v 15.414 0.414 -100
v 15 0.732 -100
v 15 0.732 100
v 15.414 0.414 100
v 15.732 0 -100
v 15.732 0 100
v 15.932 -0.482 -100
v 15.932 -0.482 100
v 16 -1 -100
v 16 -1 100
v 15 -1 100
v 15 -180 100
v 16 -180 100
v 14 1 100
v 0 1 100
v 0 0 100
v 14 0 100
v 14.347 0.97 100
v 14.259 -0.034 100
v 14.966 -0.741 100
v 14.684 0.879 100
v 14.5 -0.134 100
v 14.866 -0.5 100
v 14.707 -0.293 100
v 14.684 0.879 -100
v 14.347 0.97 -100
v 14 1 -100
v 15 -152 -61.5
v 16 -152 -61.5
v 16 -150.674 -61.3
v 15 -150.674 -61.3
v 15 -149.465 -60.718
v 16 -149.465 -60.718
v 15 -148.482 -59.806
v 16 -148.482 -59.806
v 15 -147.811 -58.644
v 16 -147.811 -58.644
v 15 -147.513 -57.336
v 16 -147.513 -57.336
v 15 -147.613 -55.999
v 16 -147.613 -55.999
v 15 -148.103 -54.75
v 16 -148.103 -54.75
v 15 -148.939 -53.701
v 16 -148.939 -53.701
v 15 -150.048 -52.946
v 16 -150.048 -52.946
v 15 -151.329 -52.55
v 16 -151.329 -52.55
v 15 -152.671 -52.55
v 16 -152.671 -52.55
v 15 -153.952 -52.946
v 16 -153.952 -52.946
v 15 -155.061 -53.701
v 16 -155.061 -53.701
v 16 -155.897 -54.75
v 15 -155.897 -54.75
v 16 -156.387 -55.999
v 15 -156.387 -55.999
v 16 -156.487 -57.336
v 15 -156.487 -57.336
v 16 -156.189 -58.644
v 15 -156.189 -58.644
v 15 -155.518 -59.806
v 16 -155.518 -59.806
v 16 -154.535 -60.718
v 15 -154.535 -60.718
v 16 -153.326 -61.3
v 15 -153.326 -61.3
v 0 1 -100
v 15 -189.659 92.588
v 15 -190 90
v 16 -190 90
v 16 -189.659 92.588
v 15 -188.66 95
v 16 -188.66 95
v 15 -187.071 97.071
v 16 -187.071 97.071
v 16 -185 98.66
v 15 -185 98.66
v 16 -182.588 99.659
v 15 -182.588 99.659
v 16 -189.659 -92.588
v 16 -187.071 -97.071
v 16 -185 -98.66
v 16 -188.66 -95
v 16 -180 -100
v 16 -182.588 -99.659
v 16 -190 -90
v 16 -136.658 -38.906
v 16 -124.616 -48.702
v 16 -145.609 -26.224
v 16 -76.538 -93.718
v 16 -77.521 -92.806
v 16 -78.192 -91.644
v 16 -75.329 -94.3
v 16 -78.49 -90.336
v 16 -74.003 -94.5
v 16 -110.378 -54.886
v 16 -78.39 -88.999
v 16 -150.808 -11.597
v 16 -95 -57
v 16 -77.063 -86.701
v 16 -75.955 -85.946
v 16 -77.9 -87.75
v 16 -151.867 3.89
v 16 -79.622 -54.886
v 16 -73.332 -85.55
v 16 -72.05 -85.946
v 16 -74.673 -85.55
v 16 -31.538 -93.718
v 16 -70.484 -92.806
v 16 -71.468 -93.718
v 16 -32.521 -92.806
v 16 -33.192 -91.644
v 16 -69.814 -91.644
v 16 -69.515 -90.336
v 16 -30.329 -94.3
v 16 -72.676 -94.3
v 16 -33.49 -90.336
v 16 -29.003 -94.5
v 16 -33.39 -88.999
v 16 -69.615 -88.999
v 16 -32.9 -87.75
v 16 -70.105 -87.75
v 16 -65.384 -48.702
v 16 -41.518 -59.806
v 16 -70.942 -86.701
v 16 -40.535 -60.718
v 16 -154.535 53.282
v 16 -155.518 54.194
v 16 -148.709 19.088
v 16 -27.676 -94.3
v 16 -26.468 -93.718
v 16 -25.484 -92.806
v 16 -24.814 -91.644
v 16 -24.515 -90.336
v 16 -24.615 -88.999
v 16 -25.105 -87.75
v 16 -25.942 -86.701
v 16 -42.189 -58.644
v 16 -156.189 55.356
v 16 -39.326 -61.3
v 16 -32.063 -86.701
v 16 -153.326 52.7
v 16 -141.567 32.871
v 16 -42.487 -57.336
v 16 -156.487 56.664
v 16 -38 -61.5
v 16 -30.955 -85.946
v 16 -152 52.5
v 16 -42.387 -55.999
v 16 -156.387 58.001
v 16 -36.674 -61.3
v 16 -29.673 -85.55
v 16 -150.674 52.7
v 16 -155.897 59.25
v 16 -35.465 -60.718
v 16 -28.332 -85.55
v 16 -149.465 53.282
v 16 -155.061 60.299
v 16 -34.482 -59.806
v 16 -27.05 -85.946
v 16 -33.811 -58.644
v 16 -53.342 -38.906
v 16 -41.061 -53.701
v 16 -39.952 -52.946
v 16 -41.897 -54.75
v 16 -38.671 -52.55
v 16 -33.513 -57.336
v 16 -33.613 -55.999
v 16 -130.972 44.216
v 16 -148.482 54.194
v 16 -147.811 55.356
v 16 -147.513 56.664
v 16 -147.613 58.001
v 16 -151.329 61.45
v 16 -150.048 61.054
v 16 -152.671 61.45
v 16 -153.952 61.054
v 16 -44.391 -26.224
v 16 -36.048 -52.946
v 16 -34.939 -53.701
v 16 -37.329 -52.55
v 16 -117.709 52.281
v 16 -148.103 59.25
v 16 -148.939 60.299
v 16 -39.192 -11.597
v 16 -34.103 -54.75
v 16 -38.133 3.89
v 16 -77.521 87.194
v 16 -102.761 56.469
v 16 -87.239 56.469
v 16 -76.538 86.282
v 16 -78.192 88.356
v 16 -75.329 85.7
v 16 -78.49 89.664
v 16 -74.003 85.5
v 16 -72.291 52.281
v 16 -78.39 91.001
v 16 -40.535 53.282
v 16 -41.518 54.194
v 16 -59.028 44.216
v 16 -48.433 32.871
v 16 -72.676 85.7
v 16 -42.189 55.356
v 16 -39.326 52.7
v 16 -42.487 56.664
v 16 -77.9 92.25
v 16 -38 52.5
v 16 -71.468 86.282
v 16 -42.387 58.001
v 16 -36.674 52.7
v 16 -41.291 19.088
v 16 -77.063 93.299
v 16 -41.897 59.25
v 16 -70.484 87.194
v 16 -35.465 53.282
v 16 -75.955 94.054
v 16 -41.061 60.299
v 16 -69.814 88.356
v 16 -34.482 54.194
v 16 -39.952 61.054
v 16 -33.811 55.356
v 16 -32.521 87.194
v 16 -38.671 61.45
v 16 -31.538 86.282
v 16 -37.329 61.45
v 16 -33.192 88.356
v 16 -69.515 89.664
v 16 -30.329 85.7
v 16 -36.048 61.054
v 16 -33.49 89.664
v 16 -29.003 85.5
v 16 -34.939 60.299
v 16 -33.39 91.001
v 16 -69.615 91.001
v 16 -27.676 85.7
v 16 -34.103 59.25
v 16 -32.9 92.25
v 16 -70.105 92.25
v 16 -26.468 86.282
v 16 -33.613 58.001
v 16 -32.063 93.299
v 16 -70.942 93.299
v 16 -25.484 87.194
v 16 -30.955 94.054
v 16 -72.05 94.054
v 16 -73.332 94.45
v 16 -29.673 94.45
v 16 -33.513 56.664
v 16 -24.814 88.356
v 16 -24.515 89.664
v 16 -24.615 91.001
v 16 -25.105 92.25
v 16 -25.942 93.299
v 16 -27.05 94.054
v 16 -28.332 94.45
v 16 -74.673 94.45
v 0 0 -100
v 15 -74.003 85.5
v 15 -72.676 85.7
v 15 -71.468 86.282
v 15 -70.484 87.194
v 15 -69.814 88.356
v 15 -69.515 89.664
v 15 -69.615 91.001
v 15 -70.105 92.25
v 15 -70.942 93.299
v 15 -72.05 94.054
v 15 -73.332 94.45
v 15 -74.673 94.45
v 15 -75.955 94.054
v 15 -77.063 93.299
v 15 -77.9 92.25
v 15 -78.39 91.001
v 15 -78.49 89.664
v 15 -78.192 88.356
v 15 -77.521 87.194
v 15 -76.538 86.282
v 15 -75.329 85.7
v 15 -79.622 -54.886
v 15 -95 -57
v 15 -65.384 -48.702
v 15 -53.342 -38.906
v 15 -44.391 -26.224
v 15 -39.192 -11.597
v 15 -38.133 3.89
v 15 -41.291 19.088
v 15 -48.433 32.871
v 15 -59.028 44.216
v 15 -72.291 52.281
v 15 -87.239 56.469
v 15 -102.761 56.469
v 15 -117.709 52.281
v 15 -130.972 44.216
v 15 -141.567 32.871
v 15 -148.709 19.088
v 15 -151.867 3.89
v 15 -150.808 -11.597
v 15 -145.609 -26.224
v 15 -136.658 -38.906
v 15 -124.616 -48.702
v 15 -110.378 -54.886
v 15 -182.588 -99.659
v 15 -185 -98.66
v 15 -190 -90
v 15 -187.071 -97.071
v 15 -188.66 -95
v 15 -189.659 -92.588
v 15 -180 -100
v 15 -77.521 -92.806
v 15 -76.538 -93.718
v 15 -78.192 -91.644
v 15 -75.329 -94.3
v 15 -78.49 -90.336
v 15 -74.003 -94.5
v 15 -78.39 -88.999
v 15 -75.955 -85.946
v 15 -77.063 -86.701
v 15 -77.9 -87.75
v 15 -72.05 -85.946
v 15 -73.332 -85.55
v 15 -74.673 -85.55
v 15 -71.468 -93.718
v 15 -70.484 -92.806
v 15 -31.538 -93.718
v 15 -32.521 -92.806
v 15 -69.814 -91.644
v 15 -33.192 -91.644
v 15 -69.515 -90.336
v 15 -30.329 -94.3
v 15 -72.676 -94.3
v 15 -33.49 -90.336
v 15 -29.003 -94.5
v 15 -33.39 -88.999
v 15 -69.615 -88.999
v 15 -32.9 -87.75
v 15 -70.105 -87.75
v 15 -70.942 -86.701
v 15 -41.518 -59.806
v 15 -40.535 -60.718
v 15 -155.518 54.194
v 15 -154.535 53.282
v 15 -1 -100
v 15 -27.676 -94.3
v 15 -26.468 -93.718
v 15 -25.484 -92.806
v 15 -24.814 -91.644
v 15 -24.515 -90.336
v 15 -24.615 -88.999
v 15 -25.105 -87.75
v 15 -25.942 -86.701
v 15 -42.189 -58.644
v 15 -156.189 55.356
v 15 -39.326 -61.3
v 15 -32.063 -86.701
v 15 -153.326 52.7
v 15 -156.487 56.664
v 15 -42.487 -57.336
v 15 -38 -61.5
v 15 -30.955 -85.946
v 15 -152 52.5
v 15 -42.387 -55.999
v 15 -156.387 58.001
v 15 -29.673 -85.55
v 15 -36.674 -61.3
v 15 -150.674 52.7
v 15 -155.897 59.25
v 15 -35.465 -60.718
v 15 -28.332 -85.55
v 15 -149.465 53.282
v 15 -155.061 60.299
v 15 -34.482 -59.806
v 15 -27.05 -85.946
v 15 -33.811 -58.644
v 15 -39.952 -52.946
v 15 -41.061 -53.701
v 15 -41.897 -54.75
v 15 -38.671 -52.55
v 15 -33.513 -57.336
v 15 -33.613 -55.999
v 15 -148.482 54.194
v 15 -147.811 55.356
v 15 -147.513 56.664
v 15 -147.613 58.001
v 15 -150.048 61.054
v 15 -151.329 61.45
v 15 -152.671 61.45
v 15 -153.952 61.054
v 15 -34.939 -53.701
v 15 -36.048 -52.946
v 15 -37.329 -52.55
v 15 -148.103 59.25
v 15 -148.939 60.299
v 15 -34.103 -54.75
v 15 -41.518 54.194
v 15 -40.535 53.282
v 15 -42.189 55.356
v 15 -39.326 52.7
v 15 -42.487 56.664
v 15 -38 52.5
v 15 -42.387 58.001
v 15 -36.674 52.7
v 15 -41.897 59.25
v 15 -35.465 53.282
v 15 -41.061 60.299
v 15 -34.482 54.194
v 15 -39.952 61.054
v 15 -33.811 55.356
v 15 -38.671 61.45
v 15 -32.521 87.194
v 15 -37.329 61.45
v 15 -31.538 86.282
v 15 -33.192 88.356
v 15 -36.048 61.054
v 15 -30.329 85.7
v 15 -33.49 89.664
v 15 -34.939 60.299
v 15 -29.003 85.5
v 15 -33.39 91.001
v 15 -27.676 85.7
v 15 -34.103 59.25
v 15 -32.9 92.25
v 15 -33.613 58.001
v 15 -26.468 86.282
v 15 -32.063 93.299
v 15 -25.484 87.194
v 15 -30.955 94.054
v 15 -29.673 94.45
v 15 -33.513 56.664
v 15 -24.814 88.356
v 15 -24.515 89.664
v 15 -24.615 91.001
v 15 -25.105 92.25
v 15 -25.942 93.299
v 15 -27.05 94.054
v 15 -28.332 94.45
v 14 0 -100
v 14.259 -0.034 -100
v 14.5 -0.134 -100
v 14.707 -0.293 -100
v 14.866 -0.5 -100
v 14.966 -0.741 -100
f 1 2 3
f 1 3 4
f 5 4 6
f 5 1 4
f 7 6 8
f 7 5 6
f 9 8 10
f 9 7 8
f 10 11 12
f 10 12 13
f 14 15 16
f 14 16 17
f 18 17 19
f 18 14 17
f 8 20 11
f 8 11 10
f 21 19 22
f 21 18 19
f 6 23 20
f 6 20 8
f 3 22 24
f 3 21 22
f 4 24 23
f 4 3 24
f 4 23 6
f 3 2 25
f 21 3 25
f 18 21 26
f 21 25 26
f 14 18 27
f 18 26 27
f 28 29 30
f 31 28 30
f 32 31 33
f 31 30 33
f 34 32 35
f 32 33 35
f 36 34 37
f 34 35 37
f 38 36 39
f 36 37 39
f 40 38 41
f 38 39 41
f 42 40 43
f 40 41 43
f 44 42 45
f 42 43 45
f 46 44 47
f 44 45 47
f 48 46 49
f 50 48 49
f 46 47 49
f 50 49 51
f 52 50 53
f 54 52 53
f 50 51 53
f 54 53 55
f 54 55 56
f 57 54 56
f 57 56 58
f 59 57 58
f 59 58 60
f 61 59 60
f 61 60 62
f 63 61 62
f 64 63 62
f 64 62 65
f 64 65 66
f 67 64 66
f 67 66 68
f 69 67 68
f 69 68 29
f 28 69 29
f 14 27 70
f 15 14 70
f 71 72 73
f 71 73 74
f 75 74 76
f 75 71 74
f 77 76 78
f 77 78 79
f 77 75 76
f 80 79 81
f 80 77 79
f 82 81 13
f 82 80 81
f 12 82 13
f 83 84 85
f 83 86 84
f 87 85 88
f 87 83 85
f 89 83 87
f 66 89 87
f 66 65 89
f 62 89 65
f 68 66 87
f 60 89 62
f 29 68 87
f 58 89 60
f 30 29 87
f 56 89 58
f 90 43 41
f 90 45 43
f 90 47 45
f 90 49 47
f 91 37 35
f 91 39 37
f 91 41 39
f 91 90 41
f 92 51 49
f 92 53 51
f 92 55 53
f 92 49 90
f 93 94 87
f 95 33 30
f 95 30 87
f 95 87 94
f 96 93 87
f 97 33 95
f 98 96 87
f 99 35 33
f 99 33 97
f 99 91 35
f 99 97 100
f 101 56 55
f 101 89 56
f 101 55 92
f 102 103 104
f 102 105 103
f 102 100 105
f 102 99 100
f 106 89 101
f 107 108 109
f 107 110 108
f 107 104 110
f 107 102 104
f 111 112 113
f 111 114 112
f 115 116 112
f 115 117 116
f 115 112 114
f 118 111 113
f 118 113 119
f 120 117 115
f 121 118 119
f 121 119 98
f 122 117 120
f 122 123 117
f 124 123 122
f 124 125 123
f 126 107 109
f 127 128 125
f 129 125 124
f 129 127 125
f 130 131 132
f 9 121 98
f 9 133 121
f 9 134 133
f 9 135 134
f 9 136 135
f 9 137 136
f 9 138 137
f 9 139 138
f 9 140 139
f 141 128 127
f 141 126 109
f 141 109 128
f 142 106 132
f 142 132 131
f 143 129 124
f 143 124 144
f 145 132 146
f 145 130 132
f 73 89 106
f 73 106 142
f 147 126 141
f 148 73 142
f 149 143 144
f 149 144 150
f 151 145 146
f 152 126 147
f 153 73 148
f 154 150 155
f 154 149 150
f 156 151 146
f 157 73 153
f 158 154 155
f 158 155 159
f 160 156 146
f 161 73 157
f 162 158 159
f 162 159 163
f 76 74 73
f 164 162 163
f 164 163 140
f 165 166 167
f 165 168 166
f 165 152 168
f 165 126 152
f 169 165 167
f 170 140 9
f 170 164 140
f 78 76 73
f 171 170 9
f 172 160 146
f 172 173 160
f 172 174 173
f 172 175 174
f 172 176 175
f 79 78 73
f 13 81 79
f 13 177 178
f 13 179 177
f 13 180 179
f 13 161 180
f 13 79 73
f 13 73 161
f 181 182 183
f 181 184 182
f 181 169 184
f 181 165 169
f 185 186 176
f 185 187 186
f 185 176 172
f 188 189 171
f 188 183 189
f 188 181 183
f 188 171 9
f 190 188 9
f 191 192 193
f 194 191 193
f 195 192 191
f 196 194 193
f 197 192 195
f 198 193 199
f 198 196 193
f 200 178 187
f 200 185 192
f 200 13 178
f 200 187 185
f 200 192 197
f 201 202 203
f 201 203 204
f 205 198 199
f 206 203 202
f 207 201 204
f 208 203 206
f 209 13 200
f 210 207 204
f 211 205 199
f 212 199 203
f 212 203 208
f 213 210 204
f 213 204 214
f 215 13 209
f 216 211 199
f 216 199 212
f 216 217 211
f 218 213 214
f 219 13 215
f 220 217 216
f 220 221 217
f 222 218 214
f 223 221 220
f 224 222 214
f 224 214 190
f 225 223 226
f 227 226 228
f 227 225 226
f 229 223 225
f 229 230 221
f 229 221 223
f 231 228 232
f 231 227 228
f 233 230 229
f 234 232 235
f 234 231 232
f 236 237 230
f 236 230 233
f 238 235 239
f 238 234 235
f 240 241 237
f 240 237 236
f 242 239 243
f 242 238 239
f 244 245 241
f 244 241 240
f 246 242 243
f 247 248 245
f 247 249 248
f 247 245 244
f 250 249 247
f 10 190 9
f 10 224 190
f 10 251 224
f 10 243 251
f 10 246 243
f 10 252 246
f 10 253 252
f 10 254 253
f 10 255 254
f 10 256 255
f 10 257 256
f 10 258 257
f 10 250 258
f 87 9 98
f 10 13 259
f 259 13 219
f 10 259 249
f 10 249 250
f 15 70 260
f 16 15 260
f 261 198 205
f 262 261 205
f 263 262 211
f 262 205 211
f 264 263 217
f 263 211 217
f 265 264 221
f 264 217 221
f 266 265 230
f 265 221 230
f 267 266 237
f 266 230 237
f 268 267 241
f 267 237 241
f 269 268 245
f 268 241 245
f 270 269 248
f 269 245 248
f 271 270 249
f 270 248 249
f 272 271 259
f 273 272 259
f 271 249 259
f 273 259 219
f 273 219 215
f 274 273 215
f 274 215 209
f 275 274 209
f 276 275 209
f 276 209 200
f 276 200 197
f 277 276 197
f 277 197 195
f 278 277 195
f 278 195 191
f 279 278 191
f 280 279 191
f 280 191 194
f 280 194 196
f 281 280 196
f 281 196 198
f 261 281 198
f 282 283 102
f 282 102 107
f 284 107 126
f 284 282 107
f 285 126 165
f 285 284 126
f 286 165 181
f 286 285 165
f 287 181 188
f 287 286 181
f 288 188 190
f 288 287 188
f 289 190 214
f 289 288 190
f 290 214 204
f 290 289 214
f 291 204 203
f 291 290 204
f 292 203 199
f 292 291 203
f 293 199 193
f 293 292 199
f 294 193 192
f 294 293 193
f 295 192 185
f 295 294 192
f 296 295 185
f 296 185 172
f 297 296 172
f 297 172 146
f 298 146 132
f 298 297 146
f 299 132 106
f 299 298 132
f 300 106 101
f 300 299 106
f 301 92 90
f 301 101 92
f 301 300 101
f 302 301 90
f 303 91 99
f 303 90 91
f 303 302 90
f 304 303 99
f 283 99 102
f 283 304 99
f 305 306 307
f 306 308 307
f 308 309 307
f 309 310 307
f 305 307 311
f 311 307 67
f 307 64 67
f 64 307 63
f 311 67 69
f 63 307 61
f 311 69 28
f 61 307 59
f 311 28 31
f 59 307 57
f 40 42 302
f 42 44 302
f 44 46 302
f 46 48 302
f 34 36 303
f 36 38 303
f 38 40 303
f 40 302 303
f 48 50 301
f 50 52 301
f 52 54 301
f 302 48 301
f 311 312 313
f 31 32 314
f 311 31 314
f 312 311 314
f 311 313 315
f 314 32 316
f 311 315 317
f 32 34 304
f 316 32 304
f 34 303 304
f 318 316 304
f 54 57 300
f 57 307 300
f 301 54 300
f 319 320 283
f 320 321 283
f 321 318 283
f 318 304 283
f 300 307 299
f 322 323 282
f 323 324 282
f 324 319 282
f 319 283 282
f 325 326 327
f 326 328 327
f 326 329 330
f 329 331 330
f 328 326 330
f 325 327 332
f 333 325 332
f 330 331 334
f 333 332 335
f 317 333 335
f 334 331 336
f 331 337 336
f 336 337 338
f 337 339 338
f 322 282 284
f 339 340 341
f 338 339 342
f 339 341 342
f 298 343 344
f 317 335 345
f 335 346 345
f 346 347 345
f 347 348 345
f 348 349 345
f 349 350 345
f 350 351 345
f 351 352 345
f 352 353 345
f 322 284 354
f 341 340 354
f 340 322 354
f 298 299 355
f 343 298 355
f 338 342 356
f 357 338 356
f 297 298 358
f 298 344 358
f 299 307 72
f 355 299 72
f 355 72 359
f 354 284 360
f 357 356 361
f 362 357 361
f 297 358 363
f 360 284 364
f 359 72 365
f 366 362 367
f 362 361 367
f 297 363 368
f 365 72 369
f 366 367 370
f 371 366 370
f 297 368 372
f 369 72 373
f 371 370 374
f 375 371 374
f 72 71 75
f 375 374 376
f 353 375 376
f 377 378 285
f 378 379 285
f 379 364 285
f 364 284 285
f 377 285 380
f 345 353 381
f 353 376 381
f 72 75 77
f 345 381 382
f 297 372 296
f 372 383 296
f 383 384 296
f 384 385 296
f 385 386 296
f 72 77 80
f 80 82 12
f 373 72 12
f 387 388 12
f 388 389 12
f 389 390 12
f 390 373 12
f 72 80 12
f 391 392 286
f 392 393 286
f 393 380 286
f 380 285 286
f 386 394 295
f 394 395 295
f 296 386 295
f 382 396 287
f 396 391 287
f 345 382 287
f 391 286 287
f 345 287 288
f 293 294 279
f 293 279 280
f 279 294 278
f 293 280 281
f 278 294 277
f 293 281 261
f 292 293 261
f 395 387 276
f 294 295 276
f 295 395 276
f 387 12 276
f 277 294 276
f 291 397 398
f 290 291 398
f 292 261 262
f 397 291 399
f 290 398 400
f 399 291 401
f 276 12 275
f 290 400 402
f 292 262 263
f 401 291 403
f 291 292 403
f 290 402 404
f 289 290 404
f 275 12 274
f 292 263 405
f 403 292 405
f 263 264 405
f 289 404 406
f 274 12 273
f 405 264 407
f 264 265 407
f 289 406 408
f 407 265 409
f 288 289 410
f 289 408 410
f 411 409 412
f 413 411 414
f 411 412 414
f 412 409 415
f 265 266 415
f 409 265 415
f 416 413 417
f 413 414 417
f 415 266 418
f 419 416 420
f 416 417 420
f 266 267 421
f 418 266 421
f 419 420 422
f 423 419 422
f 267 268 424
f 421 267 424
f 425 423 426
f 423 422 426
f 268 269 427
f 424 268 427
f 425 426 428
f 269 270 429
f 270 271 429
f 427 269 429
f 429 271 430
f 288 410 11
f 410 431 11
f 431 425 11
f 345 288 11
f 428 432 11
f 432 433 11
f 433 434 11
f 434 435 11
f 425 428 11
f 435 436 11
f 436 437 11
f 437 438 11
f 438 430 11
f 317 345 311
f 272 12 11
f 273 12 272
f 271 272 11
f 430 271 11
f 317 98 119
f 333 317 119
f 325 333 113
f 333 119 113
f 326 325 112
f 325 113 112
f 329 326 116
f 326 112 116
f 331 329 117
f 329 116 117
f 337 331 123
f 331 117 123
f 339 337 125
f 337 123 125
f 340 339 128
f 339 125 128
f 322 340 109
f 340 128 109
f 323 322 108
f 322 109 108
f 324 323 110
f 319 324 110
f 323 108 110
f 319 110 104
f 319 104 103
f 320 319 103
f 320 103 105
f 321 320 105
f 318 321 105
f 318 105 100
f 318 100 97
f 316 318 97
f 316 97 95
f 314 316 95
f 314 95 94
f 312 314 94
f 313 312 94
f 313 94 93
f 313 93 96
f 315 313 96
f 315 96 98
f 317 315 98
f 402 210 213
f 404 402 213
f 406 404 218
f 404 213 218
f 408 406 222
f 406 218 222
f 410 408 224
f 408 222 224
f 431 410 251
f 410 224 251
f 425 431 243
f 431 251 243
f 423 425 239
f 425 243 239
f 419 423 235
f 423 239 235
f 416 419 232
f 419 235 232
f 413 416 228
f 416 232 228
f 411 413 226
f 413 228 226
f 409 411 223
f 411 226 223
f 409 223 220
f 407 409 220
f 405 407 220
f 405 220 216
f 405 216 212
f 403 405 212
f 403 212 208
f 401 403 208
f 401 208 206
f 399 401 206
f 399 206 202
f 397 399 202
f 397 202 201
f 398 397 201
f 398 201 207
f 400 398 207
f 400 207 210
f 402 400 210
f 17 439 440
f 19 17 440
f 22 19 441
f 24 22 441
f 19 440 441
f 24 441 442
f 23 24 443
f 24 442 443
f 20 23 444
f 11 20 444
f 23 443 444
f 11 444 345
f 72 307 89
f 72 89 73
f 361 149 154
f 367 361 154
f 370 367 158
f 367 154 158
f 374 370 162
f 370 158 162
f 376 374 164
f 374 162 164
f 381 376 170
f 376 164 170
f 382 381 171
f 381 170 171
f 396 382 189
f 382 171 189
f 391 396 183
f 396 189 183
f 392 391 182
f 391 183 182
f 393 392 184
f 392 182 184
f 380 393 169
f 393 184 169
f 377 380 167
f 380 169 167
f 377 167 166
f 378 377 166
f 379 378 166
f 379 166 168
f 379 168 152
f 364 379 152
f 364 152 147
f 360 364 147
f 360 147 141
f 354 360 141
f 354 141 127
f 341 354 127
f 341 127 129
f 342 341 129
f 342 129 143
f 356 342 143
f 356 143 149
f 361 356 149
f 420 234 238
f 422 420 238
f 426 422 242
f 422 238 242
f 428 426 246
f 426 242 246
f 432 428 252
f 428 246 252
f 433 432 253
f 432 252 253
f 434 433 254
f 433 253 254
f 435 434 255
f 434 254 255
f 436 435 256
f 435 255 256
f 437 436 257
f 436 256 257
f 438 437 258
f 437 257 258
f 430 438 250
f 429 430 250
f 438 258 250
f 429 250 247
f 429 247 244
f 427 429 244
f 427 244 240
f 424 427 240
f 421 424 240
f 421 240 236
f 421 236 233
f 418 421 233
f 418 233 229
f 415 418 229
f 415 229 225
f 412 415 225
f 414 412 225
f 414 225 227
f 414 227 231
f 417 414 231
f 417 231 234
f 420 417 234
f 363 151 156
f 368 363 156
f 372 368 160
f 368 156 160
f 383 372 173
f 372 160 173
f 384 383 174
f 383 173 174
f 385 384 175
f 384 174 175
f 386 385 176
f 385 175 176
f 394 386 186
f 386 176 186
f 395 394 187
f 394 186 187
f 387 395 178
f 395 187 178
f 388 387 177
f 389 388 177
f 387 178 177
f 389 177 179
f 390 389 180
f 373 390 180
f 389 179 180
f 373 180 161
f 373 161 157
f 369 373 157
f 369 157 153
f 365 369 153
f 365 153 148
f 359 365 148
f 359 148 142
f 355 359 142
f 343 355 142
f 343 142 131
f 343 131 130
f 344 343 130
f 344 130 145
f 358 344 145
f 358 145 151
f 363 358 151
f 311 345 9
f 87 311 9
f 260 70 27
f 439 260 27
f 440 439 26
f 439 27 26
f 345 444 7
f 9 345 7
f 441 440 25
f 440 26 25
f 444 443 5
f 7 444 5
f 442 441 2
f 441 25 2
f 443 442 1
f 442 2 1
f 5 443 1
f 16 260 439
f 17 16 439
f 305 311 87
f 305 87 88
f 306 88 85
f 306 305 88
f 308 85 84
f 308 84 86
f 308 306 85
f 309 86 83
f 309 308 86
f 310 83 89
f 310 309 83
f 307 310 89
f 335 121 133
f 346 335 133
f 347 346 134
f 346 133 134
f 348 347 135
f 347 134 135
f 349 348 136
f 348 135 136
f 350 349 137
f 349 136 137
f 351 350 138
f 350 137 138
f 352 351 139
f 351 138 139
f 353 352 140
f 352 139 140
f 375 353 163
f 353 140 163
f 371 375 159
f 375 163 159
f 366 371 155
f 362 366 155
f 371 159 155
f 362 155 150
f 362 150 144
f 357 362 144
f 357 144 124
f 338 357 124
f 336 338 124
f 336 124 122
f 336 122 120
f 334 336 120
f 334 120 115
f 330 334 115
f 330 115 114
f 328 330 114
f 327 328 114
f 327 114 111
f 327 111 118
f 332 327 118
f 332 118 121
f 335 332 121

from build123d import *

# Parameters (mm, degrees)
CROQUIS1_R                       = 57
SALIENTE_EXTRUIR1_DEPTH          = 15
VACIADO1_T                       = 1
DESPLEGAR_PLIEGUES1_OUTLINE_W    = 1
DESPLEGAR_PLIEGUES1_OUTLINE_H    = 200
DESPLEGAR_PLIEGUES1_DEPTH        = 15
DESPLEGAR_START                  = 15
DESPLEGAR_PLIEGUES1_2_OUTLINE_W  = 14.35619449
DESPLEGAR_PLIEGUES1_2_OUTLINE_H  = 200
DESPLEGAR_PLIEGUES1_2_DEPTH      = 1
PROCESAR_START                   = -100
PROCESAR_PLIEGUES1_DEPTH         = 200
PROCESAR_PLIEGUES1_2_DEPTH       = 200
TALADRO_DE_MARGEN_PARA_M83_D     = 9
TALADRO_DE_MARGEN_PARA_M84_D     = 9
TALADRO_DE_MARGEN_PARA_M84_DEPTH = 15.42
TALADRO_DE_MARGEN_PARA_M85_D     = 9
TALADRO_DE_MARGEN_PARA_M85_DEPTH = 1.999


# Read off the part's stored shape, not the designer's step: Desplegar pliegues1, Procesar pliegues1
with BuildPart() as part:
    # Croquis1 → Saliente-Extruir1 (new body)
    with BuildSketch(Plane(origin=(0, 0, 0), x_dir=(0, 0, -1), z_dir=(1, 0, 0))):
        with BuildLine():
            Line((-100, 0), (100, 0))
            Line((100, 0), (100, -180))
            ThreePointArc((100, -180), (97.071067812, -187.071067812), (90, -190))
            Line((90, -190), (-90, -190))
            ThreePointArc((-90, -190), (-97.071067812, -187.071067812), (-100, -180))
            Line((-100, -180), (-100, 0))
        make_face()
        with Locations((0, -95)):
            Circle(CROQUIS1_R, mode=Mode.SUBTRACT)
    extrude(amount=SALIENTE_EXTRUIR1_DEPTH)

    # Vaciado1
    vaciado1_openings = [part.faces().sort_by_distance(p)[0] for p in [
        (7.5, -90, -100),
        (7.5, -187.071067812, -97.071067812),
        (7.5, -190, 0),
        (7.5, -187.071067812, 97.071067812),
        (7.5, -90, 100),
        (7.5, -95, 57),
        (0, -2.758622845, 0),
    ]]
    offset(amount=VACIADO1_T, openings=vaciado1_openings, kind=Kind.INTERSECTION)

    # Desplegar pliegues1 outline → Desplegar pliegues1 (cut)
    with BuildSketch(Plane.YZ):
        with Locations((0.5, 0)):
            Rectangle(DESPLEGAR_PLIEGUES1_OUTLINE_W, DESPLEGAR_PLIEGUES1_OUTLINE_H)
    extrude(amount=DESPLEGAR_PLIEGUES1_DEPTH, mode=Mode.SUBTRACT)

    # Desplegar pliegues1 2 outline → Desplegar pliegues1 2 (add)
    with BuildSketch(Plane.YZ.offset(DESPLEGAR_START)):
        with Locations((8.178097245, 0)):
            Rectangle(DESPLEGAR_PLIEGUES1_2_OUTLINE_W, DESPLEGAR_PLIEGUES1_2_OUTLINE_H)
    extrude(amount=DESPLEGAR_PLIEGUES1_2_DEPTH)

    # Procesar pliegues1 outline → Procesar pliegues1 (cut)
    with BuildSketch(Plane.XY.offset(PROCESAR_START)):
        with BuildLine():
            Line((15, 15.35619449), (15, 0.732050807))
            ThreePointArc((15, 0.732050807), (15.732050807, 0), (16, -1))
            Line((16, -1), (16, 15.35619449))
            Line((16, 15.35619449), (15, 15.35619449))
        make_face()
    extrude(amount=PROCESAR_PLIEGUES1_DEPTH, mode=Mode.SUBTRACT)

    # Procesar pliegues1 2 outline → Procesar pliegues1 2 (add)
    with BuildSketch(Plane.XY.offset(PROCESAR_START)):
        with BuildLine():
            Line((14, 1), (0, 1))
            Line((0, 1), (0, 0))
            Line((0, 0), (14, 0))
            ThreePointArc((14, 0), (14.707106781, -0.292893219), (15, -1))
            Line((15, -1), (15, 0.732050807))
            ThreePointArc((15, 0.732050807), (14.51763809, 0.931851652), (14, 1))
        make_face()
    extrude(amount=PROCESAR_PLIEGUES1_2_DEPTH)

    # Taladro de margen para M83 (through all)
    with Locations(Plane(origin=(15, -102.41730184, -252.760845032), x_dir=(0, 0, 1), z_dir=(-1, 0, 0))):
        with Locations((162.760845032, 73.414694032), (162.760845032, 28.414694032), (342.760845032, 73.414694032), (342.760845032, 28.414694032)):
            Hole(TALADRO_DE_MARGEN_PARA_M83_D / 2)

    # Taladro de margen para M84
    with Locations(Plane(origin=(15, -102.41730184, -252.760845032), x_dir=(0, 0, 1), z_dir=(-1, 0, 0))):
        with Locations((195.760845032, 64.41730184), (309.760845032, 64.41730184)):
            Hole(TALADRO_DE_MARGEN_PARA_M84_D / 2, depth=TALADRO_DE_MARGEN_PARA_M84_DEPTH)

    # Taladro de margen para M85
    with Locations(Plane(origin=(15, -102.41730184, -252.760845032), x_dir=(0, 0, 1), z_dir=(-1, 0, 0))):
        with Locations((309.760845032, -49.58269816), (195.760845032, -49.58269816)):
            Hole(TALADRO_DE_MARGEN_PARA_M85_D / 2, depth=TALADRO_DE_MARGEN_PARA_M85_DEPTH)


solid = part.part
